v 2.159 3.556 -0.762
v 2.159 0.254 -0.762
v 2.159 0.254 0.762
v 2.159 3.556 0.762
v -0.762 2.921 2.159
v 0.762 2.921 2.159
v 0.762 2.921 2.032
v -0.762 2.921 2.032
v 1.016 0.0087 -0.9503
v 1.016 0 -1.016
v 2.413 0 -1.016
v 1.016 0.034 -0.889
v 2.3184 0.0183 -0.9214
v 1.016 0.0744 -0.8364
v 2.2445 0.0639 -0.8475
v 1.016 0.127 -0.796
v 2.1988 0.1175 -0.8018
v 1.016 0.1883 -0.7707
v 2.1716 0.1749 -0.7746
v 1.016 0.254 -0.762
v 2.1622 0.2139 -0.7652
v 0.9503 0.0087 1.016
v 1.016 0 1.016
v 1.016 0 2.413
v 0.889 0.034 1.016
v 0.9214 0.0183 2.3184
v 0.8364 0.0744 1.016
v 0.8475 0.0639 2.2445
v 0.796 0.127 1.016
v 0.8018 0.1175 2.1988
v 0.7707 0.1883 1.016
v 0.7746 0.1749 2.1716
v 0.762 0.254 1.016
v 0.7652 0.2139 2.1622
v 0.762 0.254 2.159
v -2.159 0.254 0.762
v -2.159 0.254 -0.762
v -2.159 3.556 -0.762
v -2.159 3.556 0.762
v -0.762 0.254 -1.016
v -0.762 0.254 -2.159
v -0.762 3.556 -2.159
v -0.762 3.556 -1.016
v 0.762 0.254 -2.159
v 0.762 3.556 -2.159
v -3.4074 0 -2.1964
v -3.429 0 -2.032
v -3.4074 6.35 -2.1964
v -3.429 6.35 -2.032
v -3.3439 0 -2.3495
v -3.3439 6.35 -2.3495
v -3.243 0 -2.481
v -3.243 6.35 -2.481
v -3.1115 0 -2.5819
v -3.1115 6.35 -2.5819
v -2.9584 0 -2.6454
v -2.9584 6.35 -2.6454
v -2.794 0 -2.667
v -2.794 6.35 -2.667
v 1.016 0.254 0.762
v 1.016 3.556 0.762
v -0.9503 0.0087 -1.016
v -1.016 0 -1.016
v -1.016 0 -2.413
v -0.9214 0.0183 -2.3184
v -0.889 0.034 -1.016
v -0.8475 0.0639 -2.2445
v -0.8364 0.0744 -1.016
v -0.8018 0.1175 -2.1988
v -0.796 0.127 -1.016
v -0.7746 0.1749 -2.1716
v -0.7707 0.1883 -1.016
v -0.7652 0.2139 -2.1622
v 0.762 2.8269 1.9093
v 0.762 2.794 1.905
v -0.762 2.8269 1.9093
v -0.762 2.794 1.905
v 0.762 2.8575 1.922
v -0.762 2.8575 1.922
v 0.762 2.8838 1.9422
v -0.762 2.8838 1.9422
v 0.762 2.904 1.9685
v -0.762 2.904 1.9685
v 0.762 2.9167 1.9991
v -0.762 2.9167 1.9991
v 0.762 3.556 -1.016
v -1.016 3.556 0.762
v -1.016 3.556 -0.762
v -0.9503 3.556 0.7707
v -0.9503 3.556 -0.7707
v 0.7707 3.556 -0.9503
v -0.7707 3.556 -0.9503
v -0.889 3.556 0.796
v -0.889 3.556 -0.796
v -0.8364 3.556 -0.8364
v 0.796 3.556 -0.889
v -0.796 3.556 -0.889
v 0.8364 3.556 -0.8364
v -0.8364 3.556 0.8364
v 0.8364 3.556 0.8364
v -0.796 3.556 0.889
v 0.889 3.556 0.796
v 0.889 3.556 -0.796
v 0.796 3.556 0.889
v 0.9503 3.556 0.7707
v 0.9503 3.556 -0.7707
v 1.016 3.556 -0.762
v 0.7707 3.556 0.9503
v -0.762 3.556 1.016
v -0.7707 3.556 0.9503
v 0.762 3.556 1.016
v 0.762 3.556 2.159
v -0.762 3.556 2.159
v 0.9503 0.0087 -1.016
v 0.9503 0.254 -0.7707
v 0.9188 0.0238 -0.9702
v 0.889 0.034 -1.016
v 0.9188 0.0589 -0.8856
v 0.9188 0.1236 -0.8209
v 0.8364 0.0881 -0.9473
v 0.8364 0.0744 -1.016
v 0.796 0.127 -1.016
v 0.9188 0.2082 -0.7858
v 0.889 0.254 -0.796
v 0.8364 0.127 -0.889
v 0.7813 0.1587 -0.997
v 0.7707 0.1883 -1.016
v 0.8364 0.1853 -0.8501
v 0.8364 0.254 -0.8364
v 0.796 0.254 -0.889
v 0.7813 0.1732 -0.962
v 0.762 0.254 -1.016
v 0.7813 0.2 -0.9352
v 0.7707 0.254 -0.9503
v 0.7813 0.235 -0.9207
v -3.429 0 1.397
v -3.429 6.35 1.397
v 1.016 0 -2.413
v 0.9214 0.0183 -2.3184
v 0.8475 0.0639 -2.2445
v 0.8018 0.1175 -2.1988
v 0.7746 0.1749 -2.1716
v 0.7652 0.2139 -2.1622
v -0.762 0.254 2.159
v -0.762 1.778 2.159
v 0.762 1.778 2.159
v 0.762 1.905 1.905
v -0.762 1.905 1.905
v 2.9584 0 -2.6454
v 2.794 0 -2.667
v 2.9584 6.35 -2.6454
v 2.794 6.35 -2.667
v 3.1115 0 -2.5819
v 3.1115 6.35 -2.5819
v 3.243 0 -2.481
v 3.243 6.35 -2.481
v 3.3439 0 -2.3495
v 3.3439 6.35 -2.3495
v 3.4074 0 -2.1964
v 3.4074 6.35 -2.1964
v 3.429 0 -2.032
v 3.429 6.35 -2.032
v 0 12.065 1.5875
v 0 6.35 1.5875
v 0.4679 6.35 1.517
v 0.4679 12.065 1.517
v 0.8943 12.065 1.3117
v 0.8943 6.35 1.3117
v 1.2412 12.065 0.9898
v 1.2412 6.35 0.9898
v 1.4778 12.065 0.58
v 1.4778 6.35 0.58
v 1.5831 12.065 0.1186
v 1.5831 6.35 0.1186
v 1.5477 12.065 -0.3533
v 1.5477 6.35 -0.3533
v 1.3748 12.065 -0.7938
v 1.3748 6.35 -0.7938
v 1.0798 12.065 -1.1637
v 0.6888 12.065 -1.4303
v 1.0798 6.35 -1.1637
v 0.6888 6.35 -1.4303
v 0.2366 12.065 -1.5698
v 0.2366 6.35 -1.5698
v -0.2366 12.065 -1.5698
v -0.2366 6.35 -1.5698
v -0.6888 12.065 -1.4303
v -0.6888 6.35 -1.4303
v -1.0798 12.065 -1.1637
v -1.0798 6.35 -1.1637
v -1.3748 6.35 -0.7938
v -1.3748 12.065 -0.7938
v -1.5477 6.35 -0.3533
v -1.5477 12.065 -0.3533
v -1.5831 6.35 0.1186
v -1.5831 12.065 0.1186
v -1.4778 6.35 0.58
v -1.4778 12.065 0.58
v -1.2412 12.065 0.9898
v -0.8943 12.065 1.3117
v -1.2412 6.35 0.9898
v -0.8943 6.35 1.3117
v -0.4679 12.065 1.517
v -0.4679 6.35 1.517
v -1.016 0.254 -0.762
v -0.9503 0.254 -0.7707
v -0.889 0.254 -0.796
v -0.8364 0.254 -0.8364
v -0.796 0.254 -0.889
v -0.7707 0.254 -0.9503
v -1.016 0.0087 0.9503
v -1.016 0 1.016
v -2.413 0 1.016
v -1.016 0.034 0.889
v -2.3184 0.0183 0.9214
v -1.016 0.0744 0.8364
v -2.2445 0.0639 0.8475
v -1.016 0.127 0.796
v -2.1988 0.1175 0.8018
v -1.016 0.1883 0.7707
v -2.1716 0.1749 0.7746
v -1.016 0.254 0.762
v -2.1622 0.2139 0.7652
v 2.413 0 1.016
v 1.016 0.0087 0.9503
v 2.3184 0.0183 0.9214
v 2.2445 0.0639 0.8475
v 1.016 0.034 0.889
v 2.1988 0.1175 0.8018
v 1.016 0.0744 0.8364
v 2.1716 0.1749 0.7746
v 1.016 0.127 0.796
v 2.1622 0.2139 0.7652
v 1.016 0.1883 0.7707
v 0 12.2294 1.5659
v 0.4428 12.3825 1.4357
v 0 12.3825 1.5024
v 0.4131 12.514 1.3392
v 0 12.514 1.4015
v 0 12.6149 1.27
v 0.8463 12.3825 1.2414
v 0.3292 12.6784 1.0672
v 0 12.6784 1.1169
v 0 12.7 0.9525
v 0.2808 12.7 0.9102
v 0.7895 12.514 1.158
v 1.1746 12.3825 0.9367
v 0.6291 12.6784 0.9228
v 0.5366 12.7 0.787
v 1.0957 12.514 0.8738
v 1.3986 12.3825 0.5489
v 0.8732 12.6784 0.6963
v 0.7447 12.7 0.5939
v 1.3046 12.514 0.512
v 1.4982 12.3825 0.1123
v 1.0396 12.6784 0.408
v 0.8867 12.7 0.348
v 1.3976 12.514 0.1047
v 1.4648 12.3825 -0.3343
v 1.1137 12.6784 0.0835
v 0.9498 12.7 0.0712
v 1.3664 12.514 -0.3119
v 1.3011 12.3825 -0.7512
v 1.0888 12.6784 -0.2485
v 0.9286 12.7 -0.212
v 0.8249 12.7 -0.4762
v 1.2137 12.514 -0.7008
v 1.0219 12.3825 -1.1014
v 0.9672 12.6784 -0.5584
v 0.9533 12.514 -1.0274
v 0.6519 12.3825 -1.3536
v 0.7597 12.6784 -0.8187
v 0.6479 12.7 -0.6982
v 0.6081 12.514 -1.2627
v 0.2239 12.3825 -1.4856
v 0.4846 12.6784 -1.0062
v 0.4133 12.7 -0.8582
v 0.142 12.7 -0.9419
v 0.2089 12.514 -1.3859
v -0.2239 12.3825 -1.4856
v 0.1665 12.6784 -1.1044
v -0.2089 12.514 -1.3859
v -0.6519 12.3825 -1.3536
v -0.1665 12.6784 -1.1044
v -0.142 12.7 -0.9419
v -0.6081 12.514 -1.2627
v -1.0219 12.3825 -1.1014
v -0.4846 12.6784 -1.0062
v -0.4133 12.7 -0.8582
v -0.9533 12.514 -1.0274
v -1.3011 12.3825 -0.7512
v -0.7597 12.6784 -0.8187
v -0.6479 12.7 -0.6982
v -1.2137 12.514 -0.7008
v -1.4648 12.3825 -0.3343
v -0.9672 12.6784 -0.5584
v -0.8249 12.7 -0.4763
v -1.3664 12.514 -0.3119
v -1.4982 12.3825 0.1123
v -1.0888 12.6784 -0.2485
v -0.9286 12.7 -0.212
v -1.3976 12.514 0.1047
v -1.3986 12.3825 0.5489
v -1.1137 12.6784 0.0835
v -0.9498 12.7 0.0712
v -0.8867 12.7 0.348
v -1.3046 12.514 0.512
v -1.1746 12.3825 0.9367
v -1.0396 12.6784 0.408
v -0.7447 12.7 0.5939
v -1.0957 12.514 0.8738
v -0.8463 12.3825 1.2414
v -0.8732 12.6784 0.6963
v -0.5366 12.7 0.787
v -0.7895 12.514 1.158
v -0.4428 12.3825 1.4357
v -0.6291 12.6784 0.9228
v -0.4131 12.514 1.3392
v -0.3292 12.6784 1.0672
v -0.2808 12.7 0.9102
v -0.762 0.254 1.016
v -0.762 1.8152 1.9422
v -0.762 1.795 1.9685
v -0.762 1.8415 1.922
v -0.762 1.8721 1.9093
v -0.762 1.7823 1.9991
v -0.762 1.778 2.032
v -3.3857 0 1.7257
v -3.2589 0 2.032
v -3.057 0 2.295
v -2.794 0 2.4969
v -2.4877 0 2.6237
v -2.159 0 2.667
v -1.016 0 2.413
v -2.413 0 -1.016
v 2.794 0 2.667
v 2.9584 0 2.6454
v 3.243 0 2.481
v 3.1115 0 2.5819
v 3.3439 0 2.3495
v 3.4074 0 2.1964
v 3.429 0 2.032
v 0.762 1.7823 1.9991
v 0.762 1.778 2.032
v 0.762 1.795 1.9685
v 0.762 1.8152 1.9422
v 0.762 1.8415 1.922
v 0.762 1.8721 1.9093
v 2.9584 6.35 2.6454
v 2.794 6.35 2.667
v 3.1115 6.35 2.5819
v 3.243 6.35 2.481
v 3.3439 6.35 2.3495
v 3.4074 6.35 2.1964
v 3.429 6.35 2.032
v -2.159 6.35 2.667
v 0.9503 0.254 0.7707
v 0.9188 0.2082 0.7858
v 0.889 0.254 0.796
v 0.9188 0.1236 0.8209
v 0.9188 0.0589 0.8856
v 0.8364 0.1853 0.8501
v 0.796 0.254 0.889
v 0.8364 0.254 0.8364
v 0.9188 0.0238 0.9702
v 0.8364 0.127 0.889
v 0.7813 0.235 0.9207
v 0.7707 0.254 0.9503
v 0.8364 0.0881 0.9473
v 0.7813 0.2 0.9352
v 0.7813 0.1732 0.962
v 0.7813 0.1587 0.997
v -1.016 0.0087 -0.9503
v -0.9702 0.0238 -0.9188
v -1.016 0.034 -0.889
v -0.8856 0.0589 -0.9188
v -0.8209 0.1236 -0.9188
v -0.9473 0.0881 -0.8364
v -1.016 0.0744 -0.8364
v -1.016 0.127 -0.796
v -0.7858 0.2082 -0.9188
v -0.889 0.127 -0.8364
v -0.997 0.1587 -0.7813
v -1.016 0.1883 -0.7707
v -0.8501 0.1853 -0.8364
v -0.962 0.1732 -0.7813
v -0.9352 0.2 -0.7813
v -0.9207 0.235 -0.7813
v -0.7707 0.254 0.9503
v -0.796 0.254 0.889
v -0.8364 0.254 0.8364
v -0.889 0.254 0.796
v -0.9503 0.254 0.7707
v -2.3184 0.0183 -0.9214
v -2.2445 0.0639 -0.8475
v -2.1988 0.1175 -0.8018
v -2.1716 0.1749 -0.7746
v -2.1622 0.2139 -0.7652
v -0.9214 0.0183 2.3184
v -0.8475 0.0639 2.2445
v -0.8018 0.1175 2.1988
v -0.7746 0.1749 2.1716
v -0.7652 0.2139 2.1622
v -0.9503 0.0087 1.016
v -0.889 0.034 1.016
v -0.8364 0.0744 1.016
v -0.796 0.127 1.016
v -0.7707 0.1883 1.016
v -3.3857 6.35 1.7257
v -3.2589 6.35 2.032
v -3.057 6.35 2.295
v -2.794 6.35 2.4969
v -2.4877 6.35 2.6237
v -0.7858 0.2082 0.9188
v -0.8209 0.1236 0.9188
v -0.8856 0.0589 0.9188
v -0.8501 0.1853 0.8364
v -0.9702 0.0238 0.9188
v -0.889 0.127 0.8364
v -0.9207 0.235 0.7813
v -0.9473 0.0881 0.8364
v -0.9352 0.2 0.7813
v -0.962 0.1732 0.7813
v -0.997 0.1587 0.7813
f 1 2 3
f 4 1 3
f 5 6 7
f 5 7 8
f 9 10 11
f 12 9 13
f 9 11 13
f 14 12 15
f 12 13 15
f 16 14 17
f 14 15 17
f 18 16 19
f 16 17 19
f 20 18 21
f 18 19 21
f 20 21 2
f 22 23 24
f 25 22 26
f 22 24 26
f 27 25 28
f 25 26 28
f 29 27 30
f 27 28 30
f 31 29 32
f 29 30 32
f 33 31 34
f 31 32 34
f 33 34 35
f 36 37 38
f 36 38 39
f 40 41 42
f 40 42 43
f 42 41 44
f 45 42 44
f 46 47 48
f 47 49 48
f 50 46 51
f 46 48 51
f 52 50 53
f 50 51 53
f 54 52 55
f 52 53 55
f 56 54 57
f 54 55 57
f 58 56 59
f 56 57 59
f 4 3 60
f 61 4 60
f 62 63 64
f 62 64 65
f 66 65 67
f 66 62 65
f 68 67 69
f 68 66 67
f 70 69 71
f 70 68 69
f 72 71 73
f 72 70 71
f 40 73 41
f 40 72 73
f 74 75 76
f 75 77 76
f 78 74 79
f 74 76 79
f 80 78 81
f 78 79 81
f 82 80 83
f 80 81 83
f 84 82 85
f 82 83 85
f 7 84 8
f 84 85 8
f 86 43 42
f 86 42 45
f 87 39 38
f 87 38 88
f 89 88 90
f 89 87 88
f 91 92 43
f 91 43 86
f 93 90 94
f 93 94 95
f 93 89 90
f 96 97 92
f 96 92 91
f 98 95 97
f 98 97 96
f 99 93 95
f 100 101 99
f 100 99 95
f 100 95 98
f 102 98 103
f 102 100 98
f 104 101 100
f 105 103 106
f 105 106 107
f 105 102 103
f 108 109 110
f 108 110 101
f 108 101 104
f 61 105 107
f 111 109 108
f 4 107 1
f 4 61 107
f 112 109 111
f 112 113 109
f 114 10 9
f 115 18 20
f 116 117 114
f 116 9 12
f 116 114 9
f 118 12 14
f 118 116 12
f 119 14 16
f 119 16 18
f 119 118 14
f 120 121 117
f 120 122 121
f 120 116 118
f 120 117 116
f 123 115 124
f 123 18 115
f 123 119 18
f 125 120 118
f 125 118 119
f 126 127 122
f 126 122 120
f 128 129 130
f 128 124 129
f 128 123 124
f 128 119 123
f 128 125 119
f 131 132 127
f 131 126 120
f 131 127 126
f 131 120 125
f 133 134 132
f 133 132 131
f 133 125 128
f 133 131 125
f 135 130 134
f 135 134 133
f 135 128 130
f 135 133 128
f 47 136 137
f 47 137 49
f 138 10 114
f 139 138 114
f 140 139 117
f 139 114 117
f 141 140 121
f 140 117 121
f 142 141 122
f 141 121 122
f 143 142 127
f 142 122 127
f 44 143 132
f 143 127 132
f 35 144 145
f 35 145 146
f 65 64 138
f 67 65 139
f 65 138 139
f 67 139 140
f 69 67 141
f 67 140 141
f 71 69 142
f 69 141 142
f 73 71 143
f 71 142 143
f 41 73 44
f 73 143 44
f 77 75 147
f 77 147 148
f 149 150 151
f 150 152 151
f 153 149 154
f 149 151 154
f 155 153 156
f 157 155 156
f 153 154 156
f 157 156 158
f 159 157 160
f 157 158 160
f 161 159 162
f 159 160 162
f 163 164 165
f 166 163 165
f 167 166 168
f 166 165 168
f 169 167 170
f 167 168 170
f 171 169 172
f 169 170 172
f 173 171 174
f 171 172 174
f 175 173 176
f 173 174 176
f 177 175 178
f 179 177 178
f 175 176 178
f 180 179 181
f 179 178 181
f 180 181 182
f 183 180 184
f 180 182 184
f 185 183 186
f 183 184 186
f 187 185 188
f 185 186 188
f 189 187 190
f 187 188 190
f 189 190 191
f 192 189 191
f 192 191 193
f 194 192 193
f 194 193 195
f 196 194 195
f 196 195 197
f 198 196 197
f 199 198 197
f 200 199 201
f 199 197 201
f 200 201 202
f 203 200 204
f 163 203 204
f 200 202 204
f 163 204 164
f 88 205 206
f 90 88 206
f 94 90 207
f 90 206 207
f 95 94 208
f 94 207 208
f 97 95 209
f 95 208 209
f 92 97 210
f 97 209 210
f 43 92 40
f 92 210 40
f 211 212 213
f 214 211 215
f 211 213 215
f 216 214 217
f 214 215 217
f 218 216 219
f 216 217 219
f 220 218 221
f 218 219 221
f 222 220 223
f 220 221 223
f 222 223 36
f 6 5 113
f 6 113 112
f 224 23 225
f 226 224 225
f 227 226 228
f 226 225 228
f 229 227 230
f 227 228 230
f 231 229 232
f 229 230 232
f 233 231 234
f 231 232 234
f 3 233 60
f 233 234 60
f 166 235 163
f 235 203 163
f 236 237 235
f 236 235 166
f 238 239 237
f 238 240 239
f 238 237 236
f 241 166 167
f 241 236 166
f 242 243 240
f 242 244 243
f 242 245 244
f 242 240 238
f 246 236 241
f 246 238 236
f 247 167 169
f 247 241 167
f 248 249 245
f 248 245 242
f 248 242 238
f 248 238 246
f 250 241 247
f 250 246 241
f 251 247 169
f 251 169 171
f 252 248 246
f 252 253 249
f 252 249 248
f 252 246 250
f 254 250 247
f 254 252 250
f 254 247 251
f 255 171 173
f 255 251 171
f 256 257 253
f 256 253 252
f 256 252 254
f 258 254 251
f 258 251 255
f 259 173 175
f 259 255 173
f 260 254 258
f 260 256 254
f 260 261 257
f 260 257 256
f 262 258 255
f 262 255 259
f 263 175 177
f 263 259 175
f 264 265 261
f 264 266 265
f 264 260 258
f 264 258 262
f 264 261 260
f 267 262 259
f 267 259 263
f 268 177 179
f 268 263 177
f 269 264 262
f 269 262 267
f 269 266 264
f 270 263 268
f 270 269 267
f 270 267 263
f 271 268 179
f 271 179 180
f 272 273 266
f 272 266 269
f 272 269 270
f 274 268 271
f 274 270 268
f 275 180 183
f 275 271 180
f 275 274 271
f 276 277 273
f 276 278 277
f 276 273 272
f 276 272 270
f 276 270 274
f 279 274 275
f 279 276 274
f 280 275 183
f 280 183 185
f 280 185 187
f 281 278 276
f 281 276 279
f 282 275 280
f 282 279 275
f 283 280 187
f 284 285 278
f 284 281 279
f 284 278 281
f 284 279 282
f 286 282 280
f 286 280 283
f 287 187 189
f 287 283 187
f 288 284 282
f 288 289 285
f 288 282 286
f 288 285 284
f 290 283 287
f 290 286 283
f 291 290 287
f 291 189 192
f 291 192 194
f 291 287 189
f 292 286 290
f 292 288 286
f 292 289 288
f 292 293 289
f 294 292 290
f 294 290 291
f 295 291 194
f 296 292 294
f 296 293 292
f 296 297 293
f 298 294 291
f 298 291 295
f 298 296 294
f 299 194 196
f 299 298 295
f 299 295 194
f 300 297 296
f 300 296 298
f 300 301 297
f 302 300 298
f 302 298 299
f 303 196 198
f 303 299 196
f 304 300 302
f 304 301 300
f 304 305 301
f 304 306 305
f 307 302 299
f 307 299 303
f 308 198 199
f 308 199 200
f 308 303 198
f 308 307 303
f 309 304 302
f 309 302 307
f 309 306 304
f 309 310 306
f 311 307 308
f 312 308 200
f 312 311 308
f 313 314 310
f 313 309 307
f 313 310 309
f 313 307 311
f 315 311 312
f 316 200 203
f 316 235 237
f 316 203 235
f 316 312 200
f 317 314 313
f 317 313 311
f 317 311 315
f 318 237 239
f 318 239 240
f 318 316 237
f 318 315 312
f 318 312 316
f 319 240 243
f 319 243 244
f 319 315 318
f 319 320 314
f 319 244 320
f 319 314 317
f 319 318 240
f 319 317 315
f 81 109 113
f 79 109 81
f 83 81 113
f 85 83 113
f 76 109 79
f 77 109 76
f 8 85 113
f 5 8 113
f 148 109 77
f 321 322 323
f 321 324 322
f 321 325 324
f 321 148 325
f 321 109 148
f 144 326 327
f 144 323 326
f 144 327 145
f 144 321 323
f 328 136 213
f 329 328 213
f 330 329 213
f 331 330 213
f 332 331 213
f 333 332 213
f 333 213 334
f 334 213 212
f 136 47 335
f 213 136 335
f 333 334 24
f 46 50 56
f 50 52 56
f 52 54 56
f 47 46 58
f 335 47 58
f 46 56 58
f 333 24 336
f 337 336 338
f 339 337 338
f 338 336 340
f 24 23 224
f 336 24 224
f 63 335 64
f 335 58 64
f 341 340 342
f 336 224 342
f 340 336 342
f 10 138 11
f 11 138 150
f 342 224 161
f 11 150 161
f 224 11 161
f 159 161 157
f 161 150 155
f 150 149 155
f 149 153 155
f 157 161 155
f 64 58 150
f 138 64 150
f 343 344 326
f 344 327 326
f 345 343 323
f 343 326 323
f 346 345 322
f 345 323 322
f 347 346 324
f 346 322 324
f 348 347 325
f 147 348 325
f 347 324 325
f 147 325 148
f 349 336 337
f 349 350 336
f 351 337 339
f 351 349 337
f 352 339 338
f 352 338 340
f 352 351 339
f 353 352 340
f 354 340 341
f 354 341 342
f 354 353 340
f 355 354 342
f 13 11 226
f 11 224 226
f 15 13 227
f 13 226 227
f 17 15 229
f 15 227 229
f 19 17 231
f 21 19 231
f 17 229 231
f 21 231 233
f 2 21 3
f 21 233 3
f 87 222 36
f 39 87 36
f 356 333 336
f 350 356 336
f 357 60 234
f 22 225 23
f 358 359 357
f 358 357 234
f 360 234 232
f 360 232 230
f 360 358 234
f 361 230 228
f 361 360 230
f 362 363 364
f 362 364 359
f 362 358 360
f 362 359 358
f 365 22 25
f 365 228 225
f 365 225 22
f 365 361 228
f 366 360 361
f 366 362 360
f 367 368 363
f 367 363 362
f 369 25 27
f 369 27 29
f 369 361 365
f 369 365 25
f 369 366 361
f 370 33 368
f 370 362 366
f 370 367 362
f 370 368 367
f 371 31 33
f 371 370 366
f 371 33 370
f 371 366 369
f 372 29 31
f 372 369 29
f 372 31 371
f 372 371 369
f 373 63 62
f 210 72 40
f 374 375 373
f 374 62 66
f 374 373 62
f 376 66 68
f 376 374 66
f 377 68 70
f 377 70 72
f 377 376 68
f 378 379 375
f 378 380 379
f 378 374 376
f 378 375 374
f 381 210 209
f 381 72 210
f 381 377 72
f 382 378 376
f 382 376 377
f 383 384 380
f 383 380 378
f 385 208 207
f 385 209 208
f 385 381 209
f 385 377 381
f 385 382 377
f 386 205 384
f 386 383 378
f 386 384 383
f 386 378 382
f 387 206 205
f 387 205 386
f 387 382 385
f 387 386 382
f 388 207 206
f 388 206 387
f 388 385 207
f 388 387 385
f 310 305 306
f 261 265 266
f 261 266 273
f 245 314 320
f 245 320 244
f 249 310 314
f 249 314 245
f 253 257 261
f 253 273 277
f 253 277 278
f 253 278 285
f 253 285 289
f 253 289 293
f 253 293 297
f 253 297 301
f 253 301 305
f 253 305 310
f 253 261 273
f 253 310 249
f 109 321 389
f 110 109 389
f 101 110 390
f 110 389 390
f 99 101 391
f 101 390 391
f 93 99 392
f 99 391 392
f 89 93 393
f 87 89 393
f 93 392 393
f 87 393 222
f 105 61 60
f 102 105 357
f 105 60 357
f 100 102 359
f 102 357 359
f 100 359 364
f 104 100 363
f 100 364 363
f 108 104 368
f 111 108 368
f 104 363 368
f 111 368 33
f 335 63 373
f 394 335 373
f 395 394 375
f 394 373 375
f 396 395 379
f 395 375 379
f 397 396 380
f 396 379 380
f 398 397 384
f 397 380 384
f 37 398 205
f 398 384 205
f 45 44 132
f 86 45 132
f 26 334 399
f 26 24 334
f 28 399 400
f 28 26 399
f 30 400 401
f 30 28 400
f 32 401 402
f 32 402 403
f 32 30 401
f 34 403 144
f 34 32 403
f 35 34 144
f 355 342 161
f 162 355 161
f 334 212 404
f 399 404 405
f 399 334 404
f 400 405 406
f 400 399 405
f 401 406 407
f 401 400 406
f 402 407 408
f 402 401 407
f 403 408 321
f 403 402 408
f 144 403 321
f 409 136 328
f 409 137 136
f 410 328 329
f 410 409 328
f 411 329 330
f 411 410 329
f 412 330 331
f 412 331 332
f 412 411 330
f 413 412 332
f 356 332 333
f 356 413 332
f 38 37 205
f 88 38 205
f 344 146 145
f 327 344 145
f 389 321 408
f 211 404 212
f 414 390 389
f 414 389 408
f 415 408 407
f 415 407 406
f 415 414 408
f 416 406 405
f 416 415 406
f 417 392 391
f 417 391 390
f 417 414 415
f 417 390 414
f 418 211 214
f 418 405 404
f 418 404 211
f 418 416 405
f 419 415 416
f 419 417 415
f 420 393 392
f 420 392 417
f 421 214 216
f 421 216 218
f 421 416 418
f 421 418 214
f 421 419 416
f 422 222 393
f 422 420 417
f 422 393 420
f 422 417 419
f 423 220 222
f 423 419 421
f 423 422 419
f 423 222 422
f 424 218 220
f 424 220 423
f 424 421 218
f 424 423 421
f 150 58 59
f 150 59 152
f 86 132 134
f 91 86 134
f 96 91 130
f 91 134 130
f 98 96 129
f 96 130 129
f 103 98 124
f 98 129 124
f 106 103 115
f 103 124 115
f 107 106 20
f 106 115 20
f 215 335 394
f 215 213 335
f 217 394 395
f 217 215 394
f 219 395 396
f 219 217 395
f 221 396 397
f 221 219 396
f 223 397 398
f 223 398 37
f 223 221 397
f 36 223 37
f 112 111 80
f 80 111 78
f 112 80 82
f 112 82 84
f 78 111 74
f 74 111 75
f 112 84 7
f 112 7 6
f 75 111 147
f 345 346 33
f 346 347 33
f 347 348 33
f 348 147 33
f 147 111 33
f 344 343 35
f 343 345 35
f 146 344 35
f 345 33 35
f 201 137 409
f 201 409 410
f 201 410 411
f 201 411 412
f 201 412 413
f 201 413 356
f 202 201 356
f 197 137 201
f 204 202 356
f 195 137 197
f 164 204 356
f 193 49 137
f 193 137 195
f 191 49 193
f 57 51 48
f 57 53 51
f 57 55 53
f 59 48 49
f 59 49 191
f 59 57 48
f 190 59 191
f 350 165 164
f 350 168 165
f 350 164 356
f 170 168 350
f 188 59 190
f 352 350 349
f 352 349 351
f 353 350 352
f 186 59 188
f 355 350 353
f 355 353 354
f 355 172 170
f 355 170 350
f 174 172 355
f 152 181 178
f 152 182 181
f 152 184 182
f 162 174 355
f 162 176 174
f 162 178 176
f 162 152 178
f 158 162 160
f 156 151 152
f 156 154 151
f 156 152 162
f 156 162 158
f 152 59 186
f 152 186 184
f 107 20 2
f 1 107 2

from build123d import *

# Parameters (mm, degrees)
SKETCH1_W           = 6.858
SKETCH1_H           = 5.334
BOSS_EXTRUDE1_DEPTH = 6.35
SKETCH4_W           = 1.397
SKETCH4_H           = 1.524
SKETCH4_W_2         = 1.524
SKETCH4_H_2         = 1.397
CUT_EXTRUDE1_DEPTH  = 3.556
SKETCH5_W           = 1.524
SKETCH5_H           = 1.143
BOSS_EXTRUDE4_DEPTH = 0.254
FILLET1_R           = 0.127
FILLET3_R           = 0.635
FILLET4_R           = 0.254
FILLET5_R           = 0.254
FILLET6_R           = 1.27
SKETCH6_R           = 1.5875
BOSS_EXTRUDE5_DEPTH = 6.35
FILLET8_R           = 0.635


with BuildPart() as part:
    # Sketch1 → Boss-Extrude1 (new body)
    with BuildSketch(Plane(origin=(0, 0, 0), x_dir=(1, 0, 0), z_dir=(0, 1, 0))):
        Rectangle(SKETCH1_W, SKETCH1_H)
    extrude(amount=BOSS_EXTRUDE1_DEPTH)

    # Sketch4 → Cut-Extrude1 (cut)
    with BuildSketch(Plane.XZ):
        with Locations((-1.4605, 0)):
            Rectangle(SKETCH4_W, SKETCH4_H)
        Rectangle(SKETCH4_W_2, SKETCH4_H)
        with Locations((1.4605, 0)):
            Rectangle(SKETCH4_W, SKETCH4_H)
        with Locations((0, -1.4605)):
            Rectangle(SKETCH4_W_2, SKETCH4_H_2)
        with Locations((0, 1.4605)):
            Rectangle(SKETCH4_W_2, SKETCH4_H_2)
    extrude(amount=-CUT_EXTRUDE1_DEPTH, mode=Mode.SUBTRACT)

    # Sketch5 → Boss-Extrude4 (add)
    with BuildSketch(Plane(origin=(0, 0, 2.159), x_dir=(-1, 0, 0), z_dir=(0, 0, -1))):
        with Locations((0, 2.3495)):
            Rectangle(SKETCH5_W, SKETCH5_H)
    extrude(amount=BOSS_EXTRUDE4_DEPTH)

    # Fillet1
    fillet1_edges = [part.edges().sort_by_distance(p)[0] for p in [
        (0, 1.778, 1.905),
        (0, 2.921, 1.905),
    ]]
    fillet(fillet1_edges, radius=FILLET1_R)

    # Fillet3
    fillet3_edges = [part.edges().sort_by_distance(p)[0] for p in [
        (3.429, 3.175, 2.667),
        (-3.429, 3.175, -2.667),
        (3.429, 3.175, -2.667),
    ]]
    fillet(fillet3_edges, radius=FILLET3_R)

    # Fillet4
    fillet4_edges = [part.edges().sort_by_distance(p)[0] for p in [
        (-1.4605, 0, -0.762),
        (-2.159, 0, 0),
        (0.762, 0, 1.4605),
        (1.4605, 0, -0.762),
        (0.762, 0, -1.4605),
        (0, 0, -2.159),
        (-0.762, 0, -1.4605),
        (2.159, 0, 0),
        (1.4605, 0, 0.762),
        (0, 0, 2.159),
        (-0.762, 0, 1.4605),
        (-1.4605, 0, 0.762),
    ]]
    fillet(fillet4_edges, radius=FILLET4_R)

    # Fillet5
    # the kernel refuses this fillet: 0.254 mm, written as the material it takes off along each edge
    with BuildSketch(Plane(origin=(1.016, 0.254, -1.016), x_dir=(0, 0, 1), z_dir=(-1, 0, 0))) as fillet5_piece_1_section:
        Polygon((0, 0), (FILLET5_R, 0), (FILLET5_R, -FILLET5_R), (0, -FILLET5_R), align=None)
    fillet5_piece_1 = extrude(amount=FILLET5_R, mode=Mode.PRIVATE)
    fillet5_piece_1 = fillet5_piece_1 - Plane(origin=(1.016, 0.254, -1.016), x_dir=(0, 0.7071067811865475, -0.7071067811865475), z_dir=(-1, 0, 0)) * Sphere(FILLET5_R, mode=Mode.PRIVATE)
    add(fillet5_piece_1, mode=Mode.SUBTRACT)
    with BuildSketch(Plane(origin=(1.016, 0.254, 1.016), x_dir=(0, 0, -1), z_dir=(-1, 0, 0))) as fillet5_piece_2_section:
        Polygon((0, 0), (FILLET5_R, 0), (FILLET5_R, FILLET5_R), (0, FILLET5_R), align=None)
    fillet5_piece_2 = extrude(amount=FILLET5_R, mode=Mode.PRIVATE)
    fillet5_piece_2 = fillet5_piece_2 - Plane(origin=(1.016, 0.254, 1.016), x_dir=(0, 0.7071067811865475, 0.7071067811865475), z_dir=(-1, 0, 0)) * Sphere(FILLET5_R, mode=Mode.PRIVATE)
    add(fillet5_piece_2, mode=Mode.SUBTRACT)
    with BuildSketch(Plane(origin=(-1.016, 0.254, -1.016), x_dir=(1, 0, 0), z_dir=(0, 0, 1))) as fillet5_piece_3_section:
        Polygon((0, 0), (FILLET5_R, 0), (FILLET5_R, -FILLET5_R), (0, -FILLET5_R), align=None)
    fillet5_piece_3 = extrude(amount=FILLET5_R, mode=Mode.PRIVATE)
    fillet5_piece_3 = fillet5_piece_3 - Plane(origin=(-1.016, 0.254, -1.016), x_dir=(-0.7071067811865475, 0.7071067811865475, 0), z_dir=(0, 0, 1)) * Sphere(FILLET5_R, mode=Mode.PRIVATE)
    add(fillet5_piece_3, mode=Mode.SUBTRACT)
    with BuildSketch(Plane(origin=(-1.016, 0.254, 1.016), x_dir=(1, 0, 0), z_dir=(0, 0, -1))) as fillet5_piece_4_section:
        Polygon((0, 0), (FILLET5_R, 0), (FILLET5_R, FILLET5_R), (0, FILLET5_R), align=None)
    fillet5_piece_4 = extrude(amount=FILLET5_R, mode=Mode.PRIVATE)
    fillet5_piece_4 = fillet5_piece_4 - Plane(origin=(-1.016, 0.254, 1.016), x_dir=(-0.7071067811865475, 0.7071067811865475, 0), z_dir=(0, 0, -1)) * Sphere(FILLET5_R, mode=Mode.PRIVATE)
    add(fillet5_piece_4, mode=Mode.SUBTRACT)
    with BuildSketch(Plane(origin=(-0.762, 0.254, -0.762), x_dir=(-1, 0, 0), z_dir=(0, 1, 0)), Plane(origin=(0.762, 0.254, -0.762), x_dir=(0, 0, -1), z_dir=(0, 1, 0))) as fillet5_piece_5:
        with BuildLine():
            CenterArc((FILLET5_R, -FILLET5_R), FILLET5_R, 90, 90)
            Line((0, -FILLET5_R), (0, 0))
            Line((0, 0), (FILLET5_R, 0))
        make_face()
    extrude(amount=3.302, mode=Mode.SUBTRACT)
    with BuildSketch(Plane(origin=(-0.762, 0.254, 0.762), x_dir=(-1, 0, 0), z_dir=(0, 1, 0)), Plane(origin=(0.762, 0.254, 0.762), x_dir=(0, 0, 1), z_dir=(0, 1, 0))) as fillet5_piece_6:
        with BuildLine():
            CenterArc((FILLET5_R, FILLET5_R), FILLET5_R, 180, 90)
            Line((0, FILLET5_R), (0, 0))
            Line((0, 0), (FILLET5_R, 0))
        make_face()
    extrude(amount=3.302, mode=Mode.SUBTRACT)

    # Fillet6
    fillet6_edges = [part.edges().sort_by_distance(p)[0] for p in [
        (-3.429, 3.175, 2.667),
    ]]
    fillet(fillet6_edges, radius=FILLET6_R)

    # Sketch6 → Boss-Extrude5 (add)
    with BuildSketch(Plane(origin=(0, 6.35, 0), x_dir=(1, 0, 0), z_dir=(0, 1, 0))):
        with Locations(Location((0, 0, 0), (0, 0, 270))):
            Circle(SKETCH6_R)
    extrude(amount=BOSS_EXTRUDE5_DEPTH)

    # Fillet8
    fillet8_edges = [part.edges().sort_by_distance(p)[0] for p in [
        (0, 12.7, -1.5875),
    ]]
    fillet(fillet8_edges, radius=FILLET8_R)


solid = part.part
